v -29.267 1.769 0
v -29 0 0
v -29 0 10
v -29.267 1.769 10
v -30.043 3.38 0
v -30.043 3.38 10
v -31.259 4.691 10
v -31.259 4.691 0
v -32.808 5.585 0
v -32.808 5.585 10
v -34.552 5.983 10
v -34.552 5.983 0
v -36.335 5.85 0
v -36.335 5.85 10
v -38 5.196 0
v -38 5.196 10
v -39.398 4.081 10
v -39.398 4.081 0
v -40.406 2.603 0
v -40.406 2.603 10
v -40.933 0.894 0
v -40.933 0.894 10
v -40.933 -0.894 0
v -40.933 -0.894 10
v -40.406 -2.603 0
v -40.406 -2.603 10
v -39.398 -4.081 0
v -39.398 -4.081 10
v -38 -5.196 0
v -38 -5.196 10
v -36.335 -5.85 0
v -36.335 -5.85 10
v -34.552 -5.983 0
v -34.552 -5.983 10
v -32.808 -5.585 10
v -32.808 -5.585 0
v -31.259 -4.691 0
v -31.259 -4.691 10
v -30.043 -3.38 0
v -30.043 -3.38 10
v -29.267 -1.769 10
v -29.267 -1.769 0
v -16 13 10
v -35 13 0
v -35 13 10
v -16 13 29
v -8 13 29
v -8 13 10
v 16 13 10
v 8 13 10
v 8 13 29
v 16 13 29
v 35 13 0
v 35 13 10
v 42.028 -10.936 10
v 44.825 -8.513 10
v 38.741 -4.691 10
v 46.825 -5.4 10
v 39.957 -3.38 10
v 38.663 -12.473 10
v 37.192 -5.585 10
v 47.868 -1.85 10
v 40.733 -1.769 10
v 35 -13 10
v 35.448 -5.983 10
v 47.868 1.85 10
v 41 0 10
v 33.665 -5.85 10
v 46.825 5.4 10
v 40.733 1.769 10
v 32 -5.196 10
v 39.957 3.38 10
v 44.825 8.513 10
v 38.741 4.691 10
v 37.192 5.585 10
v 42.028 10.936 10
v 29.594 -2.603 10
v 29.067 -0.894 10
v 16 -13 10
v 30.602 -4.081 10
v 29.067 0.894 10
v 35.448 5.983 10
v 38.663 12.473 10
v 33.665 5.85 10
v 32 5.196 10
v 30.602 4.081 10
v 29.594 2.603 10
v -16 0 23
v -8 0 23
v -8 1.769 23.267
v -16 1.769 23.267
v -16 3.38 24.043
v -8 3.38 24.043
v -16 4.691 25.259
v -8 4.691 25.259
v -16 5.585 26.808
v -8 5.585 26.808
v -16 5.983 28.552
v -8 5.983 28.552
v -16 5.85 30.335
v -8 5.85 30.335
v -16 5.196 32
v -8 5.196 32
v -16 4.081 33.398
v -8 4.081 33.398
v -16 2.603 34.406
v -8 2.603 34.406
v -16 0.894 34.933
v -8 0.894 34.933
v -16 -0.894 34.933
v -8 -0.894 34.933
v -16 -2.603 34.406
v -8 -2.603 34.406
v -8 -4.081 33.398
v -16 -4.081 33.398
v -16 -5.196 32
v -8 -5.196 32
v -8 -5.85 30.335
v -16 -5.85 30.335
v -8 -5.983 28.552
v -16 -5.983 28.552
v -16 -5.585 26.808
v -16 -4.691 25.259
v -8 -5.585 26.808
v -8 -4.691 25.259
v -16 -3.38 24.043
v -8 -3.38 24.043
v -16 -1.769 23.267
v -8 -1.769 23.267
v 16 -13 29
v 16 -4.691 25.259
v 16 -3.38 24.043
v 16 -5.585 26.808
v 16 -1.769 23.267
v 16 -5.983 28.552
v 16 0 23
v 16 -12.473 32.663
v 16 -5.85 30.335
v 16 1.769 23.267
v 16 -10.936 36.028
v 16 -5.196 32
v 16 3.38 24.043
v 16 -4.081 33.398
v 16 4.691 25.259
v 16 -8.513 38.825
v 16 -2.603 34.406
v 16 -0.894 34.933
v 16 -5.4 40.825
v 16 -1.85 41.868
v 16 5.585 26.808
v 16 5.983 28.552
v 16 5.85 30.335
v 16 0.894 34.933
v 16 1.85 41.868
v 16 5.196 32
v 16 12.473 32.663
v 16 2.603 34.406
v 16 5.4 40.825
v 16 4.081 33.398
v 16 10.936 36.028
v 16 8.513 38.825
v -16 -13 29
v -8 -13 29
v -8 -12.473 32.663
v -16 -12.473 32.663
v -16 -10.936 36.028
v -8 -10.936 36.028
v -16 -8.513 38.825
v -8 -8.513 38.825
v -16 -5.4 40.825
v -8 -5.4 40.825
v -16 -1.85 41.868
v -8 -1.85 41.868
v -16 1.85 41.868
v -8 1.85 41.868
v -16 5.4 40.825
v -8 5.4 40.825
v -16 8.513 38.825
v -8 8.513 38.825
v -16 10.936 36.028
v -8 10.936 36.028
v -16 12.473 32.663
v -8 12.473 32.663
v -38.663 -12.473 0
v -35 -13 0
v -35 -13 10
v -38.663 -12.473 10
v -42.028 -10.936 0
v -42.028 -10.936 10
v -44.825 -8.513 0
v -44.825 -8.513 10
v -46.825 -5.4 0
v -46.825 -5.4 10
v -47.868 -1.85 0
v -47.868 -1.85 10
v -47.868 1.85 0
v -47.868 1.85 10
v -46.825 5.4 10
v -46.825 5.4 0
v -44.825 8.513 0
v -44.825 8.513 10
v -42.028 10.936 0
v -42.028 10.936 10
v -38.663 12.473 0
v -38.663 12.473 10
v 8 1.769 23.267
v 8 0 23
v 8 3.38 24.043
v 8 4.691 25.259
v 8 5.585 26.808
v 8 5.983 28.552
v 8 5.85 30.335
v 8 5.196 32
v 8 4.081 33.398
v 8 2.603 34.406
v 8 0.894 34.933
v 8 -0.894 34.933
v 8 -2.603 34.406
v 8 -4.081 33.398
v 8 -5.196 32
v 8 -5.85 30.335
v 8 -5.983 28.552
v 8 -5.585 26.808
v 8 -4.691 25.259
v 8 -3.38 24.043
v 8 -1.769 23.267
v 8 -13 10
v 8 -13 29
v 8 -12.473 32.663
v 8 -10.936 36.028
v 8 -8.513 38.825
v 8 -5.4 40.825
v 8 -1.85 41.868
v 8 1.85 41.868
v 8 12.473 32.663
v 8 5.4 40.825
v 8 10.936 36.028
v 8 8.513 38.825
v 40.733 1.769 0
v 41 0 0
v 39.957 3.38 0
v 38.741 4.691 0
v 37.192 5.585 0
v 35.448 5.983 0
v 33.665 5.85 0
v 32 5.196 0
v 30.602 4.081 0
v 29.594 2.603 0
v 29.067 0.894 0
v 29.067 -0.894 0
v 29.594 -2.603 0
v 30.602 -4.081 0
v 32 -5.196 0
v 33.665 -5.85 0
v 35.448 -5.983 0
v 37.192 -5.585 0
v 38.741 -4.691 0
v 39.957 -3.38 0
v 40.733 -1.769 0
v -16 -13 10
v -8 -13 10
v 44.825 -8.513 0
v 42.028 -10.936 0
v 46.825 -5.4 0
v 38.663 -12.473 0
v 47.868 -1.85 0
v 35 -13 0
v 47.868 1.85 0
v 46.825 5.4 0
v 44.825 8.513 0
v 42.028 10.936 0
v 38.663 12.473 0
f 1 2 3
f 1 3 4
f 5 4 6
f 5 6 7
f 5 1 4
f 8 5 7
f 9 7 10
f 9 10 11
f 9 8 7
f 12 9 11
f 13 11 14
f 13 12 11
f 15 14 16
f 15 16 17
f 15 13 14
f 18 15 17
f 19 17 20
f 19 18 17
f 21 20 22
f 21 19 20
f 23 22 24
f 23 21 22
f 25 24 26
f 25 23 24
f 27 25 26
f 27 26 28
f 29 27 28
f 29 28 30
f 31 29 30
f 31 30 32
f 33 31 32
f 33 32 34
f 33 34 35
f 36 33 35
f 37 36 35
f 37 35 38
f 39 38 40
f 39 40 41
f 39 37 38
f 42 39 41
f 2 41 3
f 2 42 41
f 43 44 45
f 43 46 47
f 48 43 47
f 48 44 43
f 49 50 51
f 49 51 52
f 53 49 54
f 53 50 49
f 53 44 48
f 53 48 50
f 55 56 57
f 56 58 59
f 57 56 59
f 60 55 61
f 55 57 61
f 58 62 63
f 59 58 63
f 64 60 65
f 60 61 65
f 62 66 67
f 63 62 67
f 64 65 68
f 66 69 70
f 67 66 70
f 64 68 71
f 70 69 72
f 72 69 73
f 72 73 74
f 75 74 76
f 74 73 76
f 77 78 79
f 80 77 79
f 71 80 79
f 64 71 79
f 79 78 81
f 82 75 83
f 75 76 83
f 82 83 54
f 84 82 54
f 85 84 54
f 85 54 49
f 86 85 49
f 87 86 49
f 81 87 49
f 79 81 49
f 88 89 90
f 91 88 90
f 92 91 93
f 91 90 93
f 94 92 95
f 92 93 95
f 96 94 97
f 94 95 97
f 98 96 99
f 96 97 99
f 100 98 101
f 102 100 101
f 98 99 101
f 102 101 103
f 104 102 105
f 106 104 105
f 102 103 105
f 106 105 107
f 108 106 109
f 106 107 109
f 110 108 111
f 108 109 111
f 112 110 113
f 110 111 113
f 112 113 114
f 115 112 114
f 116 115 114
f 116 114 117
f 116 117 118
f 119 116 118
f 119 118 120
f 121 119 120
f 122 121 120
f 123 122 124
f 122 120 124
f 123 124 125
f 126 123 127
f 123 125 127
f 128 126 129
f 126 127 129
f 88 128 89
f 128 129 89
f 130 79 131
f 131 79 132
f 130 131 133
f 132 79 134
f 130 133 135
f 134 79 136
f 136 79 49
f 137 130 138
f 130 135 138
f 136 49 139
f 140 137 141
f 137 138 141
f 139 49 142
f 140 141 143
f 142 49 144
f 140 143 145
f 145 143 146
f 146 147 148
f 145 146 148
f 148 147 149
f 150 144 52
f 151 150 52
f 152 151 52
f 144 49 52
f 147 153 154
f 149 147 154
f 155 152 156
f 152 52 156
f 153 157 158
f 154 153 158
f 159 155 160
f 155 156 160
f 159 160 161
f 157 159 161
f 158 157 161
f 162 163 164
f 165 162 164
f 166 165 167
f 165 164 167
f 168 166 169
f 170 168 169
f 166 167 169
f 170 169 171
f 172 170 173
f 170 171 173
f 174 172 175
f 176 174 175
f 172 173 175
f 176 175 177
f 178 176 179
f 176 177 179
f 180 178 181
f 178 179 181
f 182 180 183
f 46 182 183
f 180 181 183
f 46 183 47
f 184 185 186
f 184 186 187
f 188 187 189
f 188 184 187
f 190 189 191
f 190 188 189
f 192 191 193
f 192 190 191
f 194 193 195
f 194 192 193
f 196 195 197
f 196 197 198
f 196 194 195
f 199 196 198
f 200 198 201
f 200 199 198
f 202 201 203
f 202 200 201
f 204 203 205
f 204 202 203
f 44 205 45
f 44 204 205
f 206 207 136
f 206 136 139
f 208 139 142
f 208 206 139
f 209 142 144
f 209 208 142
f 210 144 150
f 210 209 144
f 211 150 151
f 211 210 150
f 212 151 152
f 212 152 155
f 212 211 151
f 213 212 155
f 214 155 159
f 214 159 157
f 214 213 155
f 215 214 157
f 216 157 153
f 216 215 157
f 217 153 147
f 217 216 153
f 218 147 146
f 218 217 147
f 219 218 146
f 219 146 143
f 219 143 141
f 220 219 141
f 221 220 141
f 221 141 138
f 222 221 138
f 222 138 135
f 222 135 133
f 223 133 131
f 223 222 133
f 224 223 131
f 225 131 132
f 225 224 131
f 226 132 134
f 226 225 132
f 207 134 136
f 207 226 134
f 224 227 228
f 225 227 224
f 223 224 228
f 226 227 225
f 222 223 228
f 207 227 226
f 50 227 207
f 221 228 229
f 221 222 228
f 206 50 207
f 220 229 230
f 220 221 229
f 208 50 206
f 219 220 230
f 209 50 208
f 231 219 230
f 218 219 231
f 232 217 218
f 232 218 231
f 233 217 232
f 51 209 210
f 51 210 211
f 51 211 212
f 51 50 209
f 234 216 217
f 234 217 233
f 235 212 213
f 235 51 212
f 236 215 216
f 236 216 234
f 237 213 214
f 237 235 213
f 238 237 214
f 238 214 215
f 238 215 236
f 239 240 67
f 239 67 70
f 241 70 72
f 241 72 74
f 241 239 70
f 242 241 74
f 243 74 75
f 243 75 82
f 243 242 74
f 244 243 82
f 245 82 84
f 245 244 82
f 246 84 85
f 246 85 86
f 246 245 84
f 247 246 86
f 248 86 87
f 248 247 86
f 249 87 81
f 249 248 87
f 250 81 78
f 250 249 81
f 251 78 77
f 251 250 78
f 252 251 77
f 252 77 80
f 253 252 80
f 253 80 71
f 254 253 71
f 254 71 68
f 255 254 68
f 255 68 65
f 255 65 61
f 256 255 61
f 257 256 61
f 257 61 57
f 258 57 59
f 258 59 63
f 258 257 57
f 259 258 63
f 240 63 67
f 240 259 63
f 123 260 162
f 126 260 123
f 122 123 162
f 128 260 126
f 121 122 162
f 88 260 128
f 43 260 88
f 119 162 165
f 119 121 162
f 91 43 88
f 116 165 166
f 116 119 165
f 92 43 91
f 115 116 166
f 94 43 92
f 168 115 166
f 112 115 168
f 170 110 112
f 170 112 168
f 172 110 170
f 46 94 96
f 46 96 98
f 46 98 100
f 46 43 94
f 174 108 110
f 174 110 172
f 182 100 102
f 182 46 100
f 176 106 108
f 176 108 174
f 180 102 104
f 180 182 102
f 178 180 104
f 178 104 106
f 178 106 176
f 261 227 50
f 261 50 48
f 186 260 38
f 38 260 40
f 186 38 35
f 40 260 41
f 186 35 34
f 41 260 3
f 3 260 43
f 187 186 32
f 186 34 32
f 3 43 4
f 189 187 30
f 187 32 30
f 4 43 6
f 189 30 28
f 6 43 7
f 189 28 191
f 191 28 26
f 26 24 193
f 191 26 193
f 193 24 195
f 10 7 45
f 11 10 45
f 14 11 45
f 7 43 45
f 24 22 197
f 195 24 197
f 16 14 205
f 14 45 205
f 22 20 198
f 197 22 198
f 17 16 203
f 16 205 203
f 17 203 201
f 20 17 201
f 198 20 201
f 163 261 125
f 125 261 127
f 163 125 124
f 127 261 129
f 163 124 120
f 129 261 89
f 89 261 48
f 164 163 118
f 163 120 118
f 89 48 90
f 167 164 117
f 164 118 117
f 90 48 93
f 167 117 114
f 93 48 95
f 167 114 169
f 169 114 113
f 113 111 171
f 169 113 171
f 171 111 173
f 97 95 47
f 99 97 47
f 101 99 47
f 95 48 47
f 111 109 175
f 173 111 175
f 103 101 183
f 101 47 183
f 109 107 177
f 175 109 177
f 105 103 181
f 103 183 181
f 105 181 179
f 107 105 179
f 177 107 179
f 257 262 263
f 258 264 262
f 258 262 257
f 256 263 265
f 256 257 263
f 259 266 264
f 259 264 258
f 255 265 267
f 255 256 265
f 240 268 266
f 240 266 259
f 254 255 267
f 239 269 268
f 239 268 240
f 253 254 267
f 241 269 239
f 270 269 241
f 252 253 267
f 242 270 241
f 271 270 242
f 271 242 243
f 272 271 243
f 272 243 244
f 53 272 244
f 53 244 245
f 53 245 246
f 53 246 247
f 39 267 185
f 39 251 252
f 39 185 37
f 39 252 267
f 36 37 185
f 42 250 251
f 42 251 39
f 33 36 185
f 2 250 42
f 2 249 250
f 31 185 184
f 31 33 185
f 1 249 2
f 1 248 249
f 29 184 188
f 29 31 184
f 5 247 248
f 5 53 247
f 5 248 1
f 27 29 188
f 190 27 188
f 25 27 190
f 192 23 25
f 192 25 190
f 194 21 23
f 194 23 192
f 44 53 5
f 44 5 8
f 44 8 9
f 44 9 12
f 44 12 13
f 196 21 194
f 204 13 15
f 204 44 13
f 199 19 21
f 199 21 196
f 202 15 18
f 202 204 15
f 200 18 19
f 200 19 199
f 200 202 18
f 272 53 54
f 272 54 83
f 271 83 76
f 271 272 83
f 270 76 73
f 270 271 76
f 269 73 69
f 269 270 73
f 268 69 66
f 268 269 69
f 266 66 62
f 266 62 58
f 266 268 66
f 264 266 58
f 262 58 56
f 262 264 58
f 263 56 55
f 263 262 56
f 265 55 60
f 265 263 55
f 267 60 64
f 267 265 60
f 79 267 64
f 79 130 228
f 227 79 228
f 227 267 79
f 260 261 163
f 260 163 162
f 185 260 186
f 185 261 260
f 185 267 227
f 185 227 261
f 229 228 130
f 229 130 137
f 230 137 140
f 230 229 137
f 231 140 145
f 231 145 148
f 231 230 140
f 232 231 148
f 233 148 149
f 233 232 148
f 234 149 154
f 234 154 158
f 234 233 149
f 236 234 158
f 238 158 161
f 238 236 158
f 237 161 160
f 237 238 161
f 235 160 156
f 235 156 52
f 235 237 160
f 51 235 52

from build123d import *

# Parameters (mm, degrees)
SKETCH1_R           = 6
BOSS_EXTRUDE1_DEPTH = 10
BOSS_EXTRUDE2_START = 8
SKETCH3_R           = 6
BOSS_EXTRUDE2_DEPTH = 8


with BuildPart() as part:
    # Sketch1 → Boss-Extrude1 (new body)
    with BuildSketch(Plane.XY):
        with BuildLine():
            Line((-35, 13), (35, 13))
            ThreePointArc((35, 13), (48, 0), (35, -13))
            Line((35, -13), (-35, -13))
            ThreePointArc((-35, -13), (-48, 0), (-35, 13))
        make_face()
        with Locations((-35, 0)):
            Circle(SKETCH1_R, mode=Mode.SUBTRACT)
        with Locations((35, 0)):
            Circle(SKETCH1_R, mode=Mode.SUBTRACT)
    extrude(amount=BOSS_EXTRUDE1_DEPTH)

    # Sketch3 → Boss-Extrude2 (add)
    with BuildSketch(Plane(origin=(0, 0, 0), x_dir=(0, 0, -1), z_dir=(1, 0, 0)).offset(BOSS_EXTRUDE2_START)):
        with BuildLine():
            Line((-10, -13), (-29, -13))
            ThreePointArc((-29, -13), (-42, 0), (-29, 13))
            Line((-29, 13), (-10, 13))
            Line((-10, 13), (-10, -13))
        make_face()
        with Locations((-29, 0)):
            Circle(SKETCH3_R, mode=Mode.SUBTRACT)
    boss_extrude2 = extrude(amount=BOSS_EXTRUDE2_DEPTH)

    # Mirror1: Boss-Extrude2 across plane
    add(boss_extrude2.mirror(Plane(origin=(0, 0, 0), x_dir=(0, 0, 1), z_dir=(1, 0, 0))))


solid = part.part
